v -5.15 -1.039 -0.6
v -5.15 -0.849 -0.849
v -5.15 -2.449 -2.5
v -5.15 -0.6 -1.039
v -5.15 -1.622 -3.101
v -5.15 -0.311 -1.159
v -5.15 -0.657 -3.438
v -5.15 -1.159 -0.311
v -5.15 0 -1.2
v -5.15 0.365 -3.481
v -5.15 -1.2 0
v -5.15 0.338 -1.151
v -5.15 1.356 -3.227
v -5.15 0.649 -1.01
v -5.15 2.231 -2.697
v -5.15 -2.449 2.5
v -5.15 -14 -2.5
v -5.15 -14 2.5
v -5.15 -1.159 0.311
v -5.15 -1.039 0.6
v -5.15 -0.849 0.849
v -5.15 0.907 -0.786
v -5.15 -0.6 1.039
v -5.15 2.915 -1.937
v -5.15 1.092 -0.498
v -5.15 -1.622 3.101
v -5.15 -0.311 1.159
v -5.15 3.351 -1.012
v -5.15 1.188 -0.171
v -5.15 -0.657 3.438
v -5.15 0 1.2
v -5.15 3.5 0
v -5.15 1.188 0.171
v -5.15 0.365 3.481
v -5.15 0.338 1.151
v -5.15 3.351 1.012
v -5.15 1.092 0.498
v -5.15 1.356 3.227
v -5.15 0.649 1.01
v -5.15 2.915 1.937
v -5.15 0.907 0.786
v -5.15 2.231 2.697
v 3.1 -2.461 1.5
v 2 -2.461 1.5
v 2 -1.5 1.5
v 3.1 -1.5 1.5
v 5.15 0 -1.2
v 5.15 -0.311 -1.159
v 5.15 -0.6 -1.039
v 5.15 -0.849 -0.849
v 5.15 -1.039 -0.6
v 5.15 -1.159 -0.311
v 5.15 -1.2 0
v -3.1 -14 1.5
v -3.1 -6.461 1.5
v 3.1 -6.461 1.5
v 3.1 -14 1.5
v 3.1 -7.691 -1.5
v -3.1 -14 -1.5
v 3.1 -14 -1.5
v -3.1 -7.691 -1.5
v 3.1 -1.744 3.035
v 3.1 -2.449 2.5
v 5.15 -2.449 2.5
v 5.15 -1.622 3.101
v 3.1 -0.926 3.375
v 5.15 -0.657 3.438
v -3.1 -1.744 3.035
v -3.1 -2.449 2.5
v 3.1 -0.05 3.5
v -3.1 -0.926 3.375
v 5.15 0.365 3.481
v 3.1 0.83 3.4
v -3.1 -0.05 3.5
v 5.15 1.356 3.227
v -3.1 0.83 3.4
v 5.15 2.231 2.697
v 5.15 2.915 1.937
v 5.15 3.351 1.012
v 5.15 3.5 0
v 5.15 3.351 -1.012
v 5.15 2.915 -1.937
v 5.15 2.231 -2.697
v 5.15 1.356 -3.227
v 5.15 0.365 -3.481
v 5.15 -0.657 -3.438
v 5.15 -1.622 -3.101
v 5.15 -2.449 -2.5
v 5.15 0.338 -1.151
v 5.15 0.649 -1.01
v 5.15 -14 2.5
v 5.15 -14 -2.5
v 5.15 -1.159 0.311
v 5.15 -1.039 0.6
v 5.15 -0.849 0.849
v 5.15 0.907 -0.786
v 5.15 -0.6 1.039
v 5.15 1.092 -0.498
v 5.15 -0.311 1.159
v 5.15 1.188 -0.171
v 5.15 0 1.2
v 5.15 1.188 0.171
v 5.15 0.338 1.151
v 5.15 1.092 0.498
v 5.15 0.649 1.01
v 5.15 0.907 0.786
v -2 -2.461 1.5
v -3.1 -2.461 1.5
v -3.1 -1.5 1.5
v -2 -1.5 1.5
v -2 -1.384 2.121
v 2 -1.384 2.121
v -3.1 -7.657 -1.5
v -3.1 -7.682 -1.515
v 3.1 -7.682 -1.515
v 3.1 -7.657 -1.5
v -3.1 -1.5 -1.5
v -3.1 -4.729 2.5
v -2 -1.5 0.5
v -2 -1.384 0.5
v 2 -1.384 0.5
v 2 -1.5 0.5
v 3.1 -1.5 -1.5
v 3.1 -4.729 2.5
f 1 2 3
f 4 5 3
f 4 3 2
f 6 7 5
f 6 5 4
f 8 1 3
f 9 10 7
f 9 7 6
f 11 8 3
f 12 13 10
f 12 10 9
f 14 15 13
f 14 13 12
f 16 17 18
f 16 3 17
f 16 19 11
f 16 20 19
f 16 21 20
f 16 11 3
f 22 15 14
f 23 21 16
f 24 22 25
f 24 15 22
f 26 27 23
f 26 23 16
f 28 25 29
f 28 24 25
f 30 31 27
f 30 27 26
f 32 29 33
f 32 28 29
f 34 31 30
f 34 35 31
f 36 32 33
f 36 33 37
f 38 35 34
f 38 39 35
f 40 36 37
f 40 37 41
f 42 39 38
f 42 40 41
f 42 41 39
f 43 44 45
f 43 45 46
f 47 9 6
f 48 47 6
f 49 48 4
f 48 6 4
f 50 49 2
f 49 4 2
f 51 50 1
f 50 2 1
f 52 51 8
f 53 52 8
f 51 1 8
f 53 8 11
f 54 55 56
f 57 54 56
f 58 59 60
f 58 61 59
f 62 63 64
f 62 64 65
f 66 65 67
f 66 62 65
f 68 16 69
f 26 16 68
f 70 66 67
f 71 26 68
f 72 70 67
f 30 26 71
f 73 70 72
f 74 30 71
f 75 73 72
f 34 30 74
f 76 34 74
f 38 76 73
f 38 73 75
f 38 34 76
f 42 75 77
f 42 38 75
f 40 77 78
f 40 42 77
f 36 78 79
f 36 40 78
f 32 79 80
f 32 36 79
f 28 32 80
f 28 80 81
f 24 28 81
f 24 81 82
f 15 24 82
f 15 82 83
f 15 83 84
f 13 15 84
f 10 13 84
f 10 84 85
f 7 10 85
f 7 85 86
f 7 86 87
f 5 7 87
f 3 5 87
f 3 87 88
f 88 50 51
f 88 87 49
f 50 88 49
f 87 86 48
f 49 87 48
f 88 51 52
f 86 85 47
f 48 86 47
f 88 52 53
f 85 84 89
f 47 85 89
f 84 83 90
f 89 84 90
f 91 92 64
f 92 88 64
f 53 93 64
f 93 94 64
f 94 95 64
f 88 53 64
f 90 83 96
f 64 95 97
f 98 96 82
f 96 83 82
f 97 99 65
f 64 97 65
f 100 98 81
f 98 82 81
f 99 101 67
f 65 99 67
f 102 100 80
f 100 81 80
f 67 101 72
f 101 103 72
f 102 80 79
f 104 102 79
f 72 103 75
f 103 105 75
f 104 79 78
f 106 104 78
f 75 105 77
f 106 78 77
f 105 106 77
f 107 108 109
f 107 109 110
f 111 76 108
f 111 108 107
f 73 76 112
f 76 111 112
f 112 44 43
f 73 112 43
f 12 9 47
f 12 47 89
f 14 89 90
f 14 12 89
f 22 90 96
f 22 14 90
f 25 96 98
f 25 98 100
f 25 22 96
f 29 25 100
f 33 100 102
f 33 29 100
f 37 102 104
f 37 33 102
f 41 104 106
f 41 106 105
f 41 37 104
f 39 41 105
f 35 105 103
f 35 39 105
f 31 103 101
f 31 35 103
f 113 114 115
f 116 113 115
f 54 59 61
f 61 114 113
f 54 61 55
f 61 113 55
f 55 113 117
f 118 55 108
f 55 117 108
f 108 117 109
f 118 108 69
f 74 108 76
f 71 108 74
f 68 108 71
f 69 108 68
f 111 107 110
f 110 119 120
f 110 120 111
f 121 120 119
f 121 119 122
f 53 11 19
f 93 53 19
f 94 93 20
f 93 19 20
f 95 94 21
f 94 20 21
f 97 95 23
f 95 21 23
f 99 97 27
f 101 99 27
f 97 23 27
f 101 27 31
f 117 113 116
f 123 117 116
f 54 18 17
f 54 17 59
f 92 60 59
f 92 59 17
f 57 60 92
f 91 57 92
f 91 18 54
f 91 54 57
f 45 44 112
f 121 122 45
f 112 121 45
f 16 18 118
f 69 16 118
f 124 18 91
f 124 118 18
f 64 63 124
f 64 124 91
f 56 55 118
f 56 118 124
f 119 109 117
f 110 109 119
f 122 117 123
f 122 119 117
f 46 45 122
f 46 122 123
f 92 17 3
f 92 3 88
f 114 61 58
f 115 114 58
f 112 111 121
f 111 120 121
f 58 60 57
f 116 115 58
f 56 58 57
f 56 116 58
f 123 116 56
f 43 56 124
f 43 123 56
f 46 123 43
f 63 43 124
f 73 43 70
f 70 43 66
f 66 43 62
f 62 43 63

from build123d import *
from build123d import SkipClean  # not in build123d's __all__

# Parameters (mm, degrees)
F0_W          = 10.3
F0_H          = 5
F1_DEPTH      = 10
F3_DEPTH      = 10.3
F4_DEPTH      = 11
F5_W          = 4
F5_H          = 2
F6_DEPTH      = 2
F6_DEPTH_BACK = 5
F7_W          = 6.2
F7_H          = 3
F8_DEPTH      = 8.5
F10_W         = 6.2
F10_H         = 2
F11_DEPTH     = 25
F7_W_2        = 10.3
F7_H_2        = 5
F12_DEPTH     = 4


with BuildPart() as f1:
    # F0 (on Front) → F1 (new body)
    with BuildSketch(Plane.XZ):
        Rectangle(F0_W, F0_H)
    extrude(amount=F1_DEPTH)

    # F2 (on face) → F3 (join)
    with BuildSketch(Plane(origin=(-5.15, 0, 0), x_dir=(0, -1, 0), z_dir=(-1, 0, 0))):
        with BuildLine():
            ThreePointArc((0, -1.2), (-1.2, 0), (0, 1.2))
            Line((0, 1.2), (0, 2.5))
            Line((0, 2.5), (2.4494897428, 2.5))
            ThreePointArc((2.4494897428, 2.5), (-3.5, 0), (2.4494897428, -2.5))
            Line((2.4494897428, -2.5), (0, -2.5))
            Line((0, -2.5), (0, -1.2))
        make_face()
    extrude(amount=-F3_DEPTH)

    # F2 (on face) → F4 (cut)
    with BuildSketch(Plane(origin=(-5.15, 0, 0), x_dir=(0, -1, 0), z_dir=(-1, 0, 0))):
        with BuildLine():
            ThreePointArc((0, -1.2), (0.8485281374, -0.8485281374), (1.2, 0))
            ThreePointArc((1.2, 0), (0.8485281374, 0.8485281374), (0, 1.2))
            Line((0, 1.2), (0, -1.2))
        make_face()
    with SkipClean():  # cleaning this boolean's faces spoils the solid; the shape is the same uncleaned
        extrude(amount=-F4_DEPTH, mode=Mode.SUBTRACT)

    # F5 (on face) → F6 (cut, two sides)
    with BuildSketch(Plane.XY.offset(2.5)) as f6_sk:
        with Locations((0, -2.3844429548)):
            Rectangle(F5_W, F5_H)
    extrude(amount=-F6_DEPTH, mode=Mode.SUBTRACT)
    extrude(f6_sk.sketch, amount=F6_DEPTH_BACK, mode=Mode.SUBTRACT)

    # F7 (on face) → F8 (cut)
    with BuildSketch(Plane.XZ.offset(10)):
        Rectangle(F7_W, F7_H)
    extrude(amount=-F8_DEPTH, mode=Mode.SUBTRACT)

    # F10 (on face) → F11 (cut)
    with BuildSketch(Plane(origin=(0, -6.4174682453, -3.7051270189), x_dir=(1, 0, 0), z_dir=(0, -0.8660254038, -0.5))):
        with Locations((0, 3.5294059198)):
            Rectangle(F10_W, F10_H)
    extrude(amount=-F11_DEPTH, mode=Mode.SUBTRACT)

    # F7 (on face) → F12 (join)
    with BuildSketch(Plane.XZ.offset(10)):
        Rectangle(F7_W_2, F7_H_2)
        Rectangle(F7_W, F7_H, mode=Mode.SUBTRACT)
    extrude(amount=F12_DEPTH)


solid = f1.part
